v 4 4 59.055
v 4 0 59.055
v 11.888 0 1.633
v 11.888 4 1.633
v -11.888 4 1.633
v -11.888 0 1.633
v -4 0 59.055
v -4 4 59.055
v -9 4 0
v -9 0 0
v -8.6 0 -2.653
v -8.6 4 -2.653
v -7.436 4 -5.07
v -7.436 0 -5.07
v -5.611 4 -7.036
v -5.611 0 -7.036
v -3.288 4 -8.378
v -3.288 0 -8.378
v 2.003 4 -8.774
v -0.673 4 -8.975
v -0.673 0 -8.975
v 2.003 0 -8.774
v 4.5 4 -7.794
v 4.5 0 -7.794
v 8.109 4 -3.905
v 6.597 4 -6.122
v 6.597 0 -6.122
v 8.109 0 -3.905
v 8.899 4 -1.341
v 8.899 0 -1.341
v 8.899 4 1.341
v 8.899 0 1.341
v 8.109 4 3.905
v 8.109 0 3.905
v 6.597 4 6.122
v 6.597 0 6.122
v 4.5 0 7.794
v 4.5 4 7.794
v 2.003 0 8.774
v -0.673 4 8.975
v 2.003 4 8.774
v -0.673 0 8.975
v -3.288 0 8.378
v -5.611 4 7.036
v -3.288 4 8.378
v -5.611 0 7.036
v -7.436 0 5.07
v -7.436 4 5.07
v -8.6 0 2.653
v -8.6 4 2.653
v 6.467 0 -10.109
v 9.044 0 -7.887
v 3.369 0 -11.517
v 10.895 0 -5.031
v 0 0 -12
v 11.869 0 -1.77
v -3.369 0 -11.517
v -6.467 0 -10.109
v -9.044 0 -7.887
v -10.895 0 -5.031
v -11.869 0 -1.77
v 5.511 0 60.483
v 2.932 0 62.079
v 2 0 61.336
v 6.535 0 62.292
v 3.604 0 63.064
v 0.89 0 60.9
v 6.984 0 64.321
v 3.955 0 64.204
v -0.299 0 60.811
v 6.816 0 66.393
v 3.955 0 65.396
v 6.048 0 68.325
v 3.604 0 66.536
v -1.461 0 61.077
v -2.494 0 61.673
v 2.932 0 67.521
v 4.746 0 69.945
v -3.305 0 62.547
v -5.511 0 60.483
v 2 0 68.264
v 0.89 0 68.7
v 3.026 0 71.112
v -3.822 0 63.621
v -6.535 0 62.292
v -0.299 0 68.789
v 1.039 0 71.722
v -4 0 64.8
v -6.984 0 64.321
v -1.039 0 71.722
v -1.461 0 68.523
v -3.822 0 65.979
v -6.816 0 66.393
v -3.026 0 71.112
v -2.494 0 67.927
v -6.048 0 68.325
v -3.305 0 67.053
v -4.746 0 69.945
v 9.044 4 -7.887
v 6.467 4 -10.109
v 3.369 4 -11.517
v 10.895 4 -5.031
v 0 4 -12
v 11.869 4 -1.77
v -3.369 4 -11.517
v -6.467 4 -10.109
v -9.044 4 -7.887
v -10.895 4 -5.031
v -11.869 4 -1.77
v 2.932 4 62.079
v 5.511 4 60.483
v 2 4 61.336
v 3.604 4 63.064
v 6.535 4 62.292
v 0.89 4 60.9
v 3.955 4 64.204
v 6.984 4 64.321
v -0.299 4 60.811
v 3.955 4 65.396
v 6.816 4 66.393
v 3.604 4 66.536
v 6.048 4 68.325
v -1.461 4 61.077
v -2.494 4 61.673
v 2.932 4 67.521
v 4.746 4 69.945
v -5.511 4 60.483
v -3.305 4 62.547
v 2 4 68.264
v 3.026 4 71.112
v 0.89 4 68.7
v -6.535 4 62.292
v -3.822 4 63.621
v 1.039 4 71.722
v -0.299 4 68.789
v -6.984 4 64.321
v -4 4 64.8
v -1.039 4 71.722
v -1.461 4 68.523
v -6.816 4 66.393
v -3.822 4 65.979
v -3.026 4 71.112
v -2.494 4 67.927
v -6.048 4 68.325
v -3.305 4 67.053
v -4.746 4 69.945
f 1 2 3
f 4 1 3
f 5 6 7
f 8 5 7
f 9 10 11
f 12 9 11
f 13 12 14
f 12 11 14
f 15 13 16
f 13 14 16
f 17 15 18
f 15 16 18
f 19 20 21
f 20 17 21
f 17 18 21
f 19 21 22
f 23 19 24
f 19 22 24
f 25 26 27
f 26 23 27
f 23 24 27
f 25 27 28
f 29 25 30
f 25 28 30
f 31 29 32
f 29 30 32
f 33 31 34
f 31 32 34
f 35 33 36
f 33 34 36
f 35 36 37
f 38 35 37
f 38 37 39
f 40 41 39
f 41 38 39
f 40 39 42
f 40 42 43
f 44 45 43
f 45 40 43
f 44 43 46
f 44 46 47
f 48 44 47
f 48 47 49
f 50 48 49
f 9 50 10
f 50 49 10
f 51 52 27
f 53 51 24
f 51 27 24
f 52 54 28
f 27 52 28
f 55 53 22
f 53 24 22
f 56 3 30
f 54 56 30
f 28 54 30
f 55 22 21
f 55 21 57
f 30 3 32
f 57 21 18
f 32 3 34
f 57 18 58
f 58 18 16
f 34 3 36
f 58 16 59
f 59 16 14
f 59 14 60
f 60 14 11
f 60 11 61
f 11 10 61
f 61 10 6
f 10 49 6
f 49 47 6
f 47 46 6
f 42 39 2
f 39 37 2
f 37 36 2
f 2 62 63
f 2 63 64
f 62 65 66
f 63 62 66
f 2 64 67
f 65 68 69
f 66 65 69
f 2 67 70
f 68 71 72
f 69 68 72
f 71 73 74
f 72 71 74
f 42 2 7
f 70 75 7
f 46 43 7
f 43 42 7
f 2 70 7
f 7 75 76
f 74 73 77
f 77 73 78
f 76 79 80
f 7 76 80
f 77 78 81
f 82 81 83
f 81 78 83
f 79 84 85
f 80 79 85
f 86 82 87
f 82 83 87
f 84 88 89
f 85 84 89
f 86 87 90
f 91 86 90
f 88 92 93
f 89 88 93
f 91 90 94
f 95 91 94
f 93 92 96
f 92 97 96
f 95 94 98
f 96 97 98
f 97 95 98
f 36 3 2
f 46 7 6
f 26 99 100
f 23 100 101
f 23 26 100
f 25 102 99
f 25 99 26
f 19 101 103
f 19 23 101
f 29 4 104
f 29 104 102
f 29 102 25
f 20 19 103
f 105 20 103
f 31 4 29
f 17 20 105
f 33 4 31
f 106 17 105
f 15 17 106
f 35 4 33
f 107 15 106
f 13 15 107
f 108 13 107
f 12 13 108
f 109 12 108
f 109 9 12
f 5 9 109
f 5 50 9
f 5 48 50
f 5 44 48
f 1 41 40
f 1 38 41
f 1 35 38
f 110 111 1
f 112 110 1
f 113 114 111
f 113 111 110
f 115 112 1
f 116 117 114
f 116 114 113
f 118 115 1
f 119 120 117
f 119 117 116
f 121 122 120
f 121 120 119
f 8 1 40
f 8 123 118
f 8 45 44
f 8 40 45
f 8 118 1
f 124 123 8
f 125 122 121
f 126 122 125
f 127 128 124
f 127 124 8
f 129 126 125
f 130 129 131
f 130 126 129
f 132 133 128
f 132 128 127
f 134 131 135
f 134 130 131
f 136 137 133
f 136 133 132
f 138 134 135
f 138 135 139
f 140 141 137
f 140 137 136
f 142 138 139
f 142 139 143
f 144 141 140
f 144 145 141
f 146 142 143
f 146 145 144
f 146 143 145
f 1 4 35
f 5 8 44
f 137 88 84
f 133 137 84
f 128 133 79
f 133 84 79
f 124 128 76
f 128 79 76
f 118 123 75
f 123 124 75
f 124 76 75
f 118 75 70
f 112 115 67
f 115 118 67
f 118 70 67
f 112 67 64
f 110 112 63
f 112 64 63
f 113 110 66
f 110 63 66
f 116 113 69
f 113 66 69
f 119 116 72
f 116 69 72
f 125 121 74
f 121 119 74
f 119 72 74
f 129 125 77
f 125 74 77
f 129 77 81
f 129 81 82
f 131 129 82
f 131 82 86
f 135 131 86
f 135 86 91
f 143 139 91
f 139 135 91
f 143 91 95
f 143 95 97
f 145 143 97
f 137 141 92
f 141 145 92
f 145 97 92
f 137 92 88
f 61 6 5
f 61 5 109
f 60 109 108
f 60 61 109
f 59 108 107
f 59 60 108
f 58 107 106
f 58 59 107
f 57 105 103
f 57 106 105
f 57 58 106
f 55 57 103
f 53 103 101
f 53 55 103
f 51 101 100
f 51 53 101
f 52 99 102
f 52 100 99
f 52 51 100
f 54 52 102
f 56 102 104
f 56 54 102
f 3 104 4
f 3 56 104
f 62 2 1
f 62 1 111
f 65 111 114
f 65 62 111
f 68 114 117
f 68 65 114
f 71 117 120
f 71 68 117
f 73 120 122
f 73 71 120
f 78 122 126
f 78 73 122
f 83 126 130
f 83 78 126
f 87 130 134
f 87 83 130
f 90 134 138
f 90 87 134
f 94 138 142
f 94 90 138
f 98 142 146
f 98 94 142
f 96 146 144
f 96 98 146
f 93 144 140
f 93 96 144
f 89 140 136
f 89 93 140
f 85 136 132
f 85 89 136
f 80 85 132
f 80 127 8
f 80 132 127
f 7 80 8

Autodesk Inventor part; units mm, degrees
ref_plane "YZ Plane" through (0, 0, 0) normal (1, 0, 0) x (0, 1, 0)
ref_plane "XZ Plane" through (0, 0, 0) normal (0, 1, 0) x (-1, 0, 0)
ref_plane "XY Plane" through (0, 0, 0) normal (0, 0, 1) x (1, 0, 0)
sketch "Sketch2" plane through (0, 0, 0) normal (0, 1, 0) x (-1, 0, 0)
  line L0 (0, -28.76) -> (0, 88.56) construction
  circle A0 centre (0, 64.8) radius 4
  arc A1 (4, 59.0554) -> (-4, 59.0554) centre (0, 64.8) ccw
  line L1 (-4, 59.0554) -> (-11.8883, 1.6332)
  line L2 (11.8883, 1.6332) -> (4, 59.0554)
  circle A2 centre (0, 0) radius 9
  arc A3 (-11.8883, 1.6332) -> (11.8883, 1.6332) centre (0, 0) ccw
  dimension "d7" = 3
  dimension "d8" = 8
  dimension "d22" = 64.8
  dimension "d25" = 3
  dimension "d26" = 18
  dimension "d27" = 8
extrude "Extrusion1" add sketch "Sketch2" along normal blind 4
properties part number "P012" material "Iron, Gray"
